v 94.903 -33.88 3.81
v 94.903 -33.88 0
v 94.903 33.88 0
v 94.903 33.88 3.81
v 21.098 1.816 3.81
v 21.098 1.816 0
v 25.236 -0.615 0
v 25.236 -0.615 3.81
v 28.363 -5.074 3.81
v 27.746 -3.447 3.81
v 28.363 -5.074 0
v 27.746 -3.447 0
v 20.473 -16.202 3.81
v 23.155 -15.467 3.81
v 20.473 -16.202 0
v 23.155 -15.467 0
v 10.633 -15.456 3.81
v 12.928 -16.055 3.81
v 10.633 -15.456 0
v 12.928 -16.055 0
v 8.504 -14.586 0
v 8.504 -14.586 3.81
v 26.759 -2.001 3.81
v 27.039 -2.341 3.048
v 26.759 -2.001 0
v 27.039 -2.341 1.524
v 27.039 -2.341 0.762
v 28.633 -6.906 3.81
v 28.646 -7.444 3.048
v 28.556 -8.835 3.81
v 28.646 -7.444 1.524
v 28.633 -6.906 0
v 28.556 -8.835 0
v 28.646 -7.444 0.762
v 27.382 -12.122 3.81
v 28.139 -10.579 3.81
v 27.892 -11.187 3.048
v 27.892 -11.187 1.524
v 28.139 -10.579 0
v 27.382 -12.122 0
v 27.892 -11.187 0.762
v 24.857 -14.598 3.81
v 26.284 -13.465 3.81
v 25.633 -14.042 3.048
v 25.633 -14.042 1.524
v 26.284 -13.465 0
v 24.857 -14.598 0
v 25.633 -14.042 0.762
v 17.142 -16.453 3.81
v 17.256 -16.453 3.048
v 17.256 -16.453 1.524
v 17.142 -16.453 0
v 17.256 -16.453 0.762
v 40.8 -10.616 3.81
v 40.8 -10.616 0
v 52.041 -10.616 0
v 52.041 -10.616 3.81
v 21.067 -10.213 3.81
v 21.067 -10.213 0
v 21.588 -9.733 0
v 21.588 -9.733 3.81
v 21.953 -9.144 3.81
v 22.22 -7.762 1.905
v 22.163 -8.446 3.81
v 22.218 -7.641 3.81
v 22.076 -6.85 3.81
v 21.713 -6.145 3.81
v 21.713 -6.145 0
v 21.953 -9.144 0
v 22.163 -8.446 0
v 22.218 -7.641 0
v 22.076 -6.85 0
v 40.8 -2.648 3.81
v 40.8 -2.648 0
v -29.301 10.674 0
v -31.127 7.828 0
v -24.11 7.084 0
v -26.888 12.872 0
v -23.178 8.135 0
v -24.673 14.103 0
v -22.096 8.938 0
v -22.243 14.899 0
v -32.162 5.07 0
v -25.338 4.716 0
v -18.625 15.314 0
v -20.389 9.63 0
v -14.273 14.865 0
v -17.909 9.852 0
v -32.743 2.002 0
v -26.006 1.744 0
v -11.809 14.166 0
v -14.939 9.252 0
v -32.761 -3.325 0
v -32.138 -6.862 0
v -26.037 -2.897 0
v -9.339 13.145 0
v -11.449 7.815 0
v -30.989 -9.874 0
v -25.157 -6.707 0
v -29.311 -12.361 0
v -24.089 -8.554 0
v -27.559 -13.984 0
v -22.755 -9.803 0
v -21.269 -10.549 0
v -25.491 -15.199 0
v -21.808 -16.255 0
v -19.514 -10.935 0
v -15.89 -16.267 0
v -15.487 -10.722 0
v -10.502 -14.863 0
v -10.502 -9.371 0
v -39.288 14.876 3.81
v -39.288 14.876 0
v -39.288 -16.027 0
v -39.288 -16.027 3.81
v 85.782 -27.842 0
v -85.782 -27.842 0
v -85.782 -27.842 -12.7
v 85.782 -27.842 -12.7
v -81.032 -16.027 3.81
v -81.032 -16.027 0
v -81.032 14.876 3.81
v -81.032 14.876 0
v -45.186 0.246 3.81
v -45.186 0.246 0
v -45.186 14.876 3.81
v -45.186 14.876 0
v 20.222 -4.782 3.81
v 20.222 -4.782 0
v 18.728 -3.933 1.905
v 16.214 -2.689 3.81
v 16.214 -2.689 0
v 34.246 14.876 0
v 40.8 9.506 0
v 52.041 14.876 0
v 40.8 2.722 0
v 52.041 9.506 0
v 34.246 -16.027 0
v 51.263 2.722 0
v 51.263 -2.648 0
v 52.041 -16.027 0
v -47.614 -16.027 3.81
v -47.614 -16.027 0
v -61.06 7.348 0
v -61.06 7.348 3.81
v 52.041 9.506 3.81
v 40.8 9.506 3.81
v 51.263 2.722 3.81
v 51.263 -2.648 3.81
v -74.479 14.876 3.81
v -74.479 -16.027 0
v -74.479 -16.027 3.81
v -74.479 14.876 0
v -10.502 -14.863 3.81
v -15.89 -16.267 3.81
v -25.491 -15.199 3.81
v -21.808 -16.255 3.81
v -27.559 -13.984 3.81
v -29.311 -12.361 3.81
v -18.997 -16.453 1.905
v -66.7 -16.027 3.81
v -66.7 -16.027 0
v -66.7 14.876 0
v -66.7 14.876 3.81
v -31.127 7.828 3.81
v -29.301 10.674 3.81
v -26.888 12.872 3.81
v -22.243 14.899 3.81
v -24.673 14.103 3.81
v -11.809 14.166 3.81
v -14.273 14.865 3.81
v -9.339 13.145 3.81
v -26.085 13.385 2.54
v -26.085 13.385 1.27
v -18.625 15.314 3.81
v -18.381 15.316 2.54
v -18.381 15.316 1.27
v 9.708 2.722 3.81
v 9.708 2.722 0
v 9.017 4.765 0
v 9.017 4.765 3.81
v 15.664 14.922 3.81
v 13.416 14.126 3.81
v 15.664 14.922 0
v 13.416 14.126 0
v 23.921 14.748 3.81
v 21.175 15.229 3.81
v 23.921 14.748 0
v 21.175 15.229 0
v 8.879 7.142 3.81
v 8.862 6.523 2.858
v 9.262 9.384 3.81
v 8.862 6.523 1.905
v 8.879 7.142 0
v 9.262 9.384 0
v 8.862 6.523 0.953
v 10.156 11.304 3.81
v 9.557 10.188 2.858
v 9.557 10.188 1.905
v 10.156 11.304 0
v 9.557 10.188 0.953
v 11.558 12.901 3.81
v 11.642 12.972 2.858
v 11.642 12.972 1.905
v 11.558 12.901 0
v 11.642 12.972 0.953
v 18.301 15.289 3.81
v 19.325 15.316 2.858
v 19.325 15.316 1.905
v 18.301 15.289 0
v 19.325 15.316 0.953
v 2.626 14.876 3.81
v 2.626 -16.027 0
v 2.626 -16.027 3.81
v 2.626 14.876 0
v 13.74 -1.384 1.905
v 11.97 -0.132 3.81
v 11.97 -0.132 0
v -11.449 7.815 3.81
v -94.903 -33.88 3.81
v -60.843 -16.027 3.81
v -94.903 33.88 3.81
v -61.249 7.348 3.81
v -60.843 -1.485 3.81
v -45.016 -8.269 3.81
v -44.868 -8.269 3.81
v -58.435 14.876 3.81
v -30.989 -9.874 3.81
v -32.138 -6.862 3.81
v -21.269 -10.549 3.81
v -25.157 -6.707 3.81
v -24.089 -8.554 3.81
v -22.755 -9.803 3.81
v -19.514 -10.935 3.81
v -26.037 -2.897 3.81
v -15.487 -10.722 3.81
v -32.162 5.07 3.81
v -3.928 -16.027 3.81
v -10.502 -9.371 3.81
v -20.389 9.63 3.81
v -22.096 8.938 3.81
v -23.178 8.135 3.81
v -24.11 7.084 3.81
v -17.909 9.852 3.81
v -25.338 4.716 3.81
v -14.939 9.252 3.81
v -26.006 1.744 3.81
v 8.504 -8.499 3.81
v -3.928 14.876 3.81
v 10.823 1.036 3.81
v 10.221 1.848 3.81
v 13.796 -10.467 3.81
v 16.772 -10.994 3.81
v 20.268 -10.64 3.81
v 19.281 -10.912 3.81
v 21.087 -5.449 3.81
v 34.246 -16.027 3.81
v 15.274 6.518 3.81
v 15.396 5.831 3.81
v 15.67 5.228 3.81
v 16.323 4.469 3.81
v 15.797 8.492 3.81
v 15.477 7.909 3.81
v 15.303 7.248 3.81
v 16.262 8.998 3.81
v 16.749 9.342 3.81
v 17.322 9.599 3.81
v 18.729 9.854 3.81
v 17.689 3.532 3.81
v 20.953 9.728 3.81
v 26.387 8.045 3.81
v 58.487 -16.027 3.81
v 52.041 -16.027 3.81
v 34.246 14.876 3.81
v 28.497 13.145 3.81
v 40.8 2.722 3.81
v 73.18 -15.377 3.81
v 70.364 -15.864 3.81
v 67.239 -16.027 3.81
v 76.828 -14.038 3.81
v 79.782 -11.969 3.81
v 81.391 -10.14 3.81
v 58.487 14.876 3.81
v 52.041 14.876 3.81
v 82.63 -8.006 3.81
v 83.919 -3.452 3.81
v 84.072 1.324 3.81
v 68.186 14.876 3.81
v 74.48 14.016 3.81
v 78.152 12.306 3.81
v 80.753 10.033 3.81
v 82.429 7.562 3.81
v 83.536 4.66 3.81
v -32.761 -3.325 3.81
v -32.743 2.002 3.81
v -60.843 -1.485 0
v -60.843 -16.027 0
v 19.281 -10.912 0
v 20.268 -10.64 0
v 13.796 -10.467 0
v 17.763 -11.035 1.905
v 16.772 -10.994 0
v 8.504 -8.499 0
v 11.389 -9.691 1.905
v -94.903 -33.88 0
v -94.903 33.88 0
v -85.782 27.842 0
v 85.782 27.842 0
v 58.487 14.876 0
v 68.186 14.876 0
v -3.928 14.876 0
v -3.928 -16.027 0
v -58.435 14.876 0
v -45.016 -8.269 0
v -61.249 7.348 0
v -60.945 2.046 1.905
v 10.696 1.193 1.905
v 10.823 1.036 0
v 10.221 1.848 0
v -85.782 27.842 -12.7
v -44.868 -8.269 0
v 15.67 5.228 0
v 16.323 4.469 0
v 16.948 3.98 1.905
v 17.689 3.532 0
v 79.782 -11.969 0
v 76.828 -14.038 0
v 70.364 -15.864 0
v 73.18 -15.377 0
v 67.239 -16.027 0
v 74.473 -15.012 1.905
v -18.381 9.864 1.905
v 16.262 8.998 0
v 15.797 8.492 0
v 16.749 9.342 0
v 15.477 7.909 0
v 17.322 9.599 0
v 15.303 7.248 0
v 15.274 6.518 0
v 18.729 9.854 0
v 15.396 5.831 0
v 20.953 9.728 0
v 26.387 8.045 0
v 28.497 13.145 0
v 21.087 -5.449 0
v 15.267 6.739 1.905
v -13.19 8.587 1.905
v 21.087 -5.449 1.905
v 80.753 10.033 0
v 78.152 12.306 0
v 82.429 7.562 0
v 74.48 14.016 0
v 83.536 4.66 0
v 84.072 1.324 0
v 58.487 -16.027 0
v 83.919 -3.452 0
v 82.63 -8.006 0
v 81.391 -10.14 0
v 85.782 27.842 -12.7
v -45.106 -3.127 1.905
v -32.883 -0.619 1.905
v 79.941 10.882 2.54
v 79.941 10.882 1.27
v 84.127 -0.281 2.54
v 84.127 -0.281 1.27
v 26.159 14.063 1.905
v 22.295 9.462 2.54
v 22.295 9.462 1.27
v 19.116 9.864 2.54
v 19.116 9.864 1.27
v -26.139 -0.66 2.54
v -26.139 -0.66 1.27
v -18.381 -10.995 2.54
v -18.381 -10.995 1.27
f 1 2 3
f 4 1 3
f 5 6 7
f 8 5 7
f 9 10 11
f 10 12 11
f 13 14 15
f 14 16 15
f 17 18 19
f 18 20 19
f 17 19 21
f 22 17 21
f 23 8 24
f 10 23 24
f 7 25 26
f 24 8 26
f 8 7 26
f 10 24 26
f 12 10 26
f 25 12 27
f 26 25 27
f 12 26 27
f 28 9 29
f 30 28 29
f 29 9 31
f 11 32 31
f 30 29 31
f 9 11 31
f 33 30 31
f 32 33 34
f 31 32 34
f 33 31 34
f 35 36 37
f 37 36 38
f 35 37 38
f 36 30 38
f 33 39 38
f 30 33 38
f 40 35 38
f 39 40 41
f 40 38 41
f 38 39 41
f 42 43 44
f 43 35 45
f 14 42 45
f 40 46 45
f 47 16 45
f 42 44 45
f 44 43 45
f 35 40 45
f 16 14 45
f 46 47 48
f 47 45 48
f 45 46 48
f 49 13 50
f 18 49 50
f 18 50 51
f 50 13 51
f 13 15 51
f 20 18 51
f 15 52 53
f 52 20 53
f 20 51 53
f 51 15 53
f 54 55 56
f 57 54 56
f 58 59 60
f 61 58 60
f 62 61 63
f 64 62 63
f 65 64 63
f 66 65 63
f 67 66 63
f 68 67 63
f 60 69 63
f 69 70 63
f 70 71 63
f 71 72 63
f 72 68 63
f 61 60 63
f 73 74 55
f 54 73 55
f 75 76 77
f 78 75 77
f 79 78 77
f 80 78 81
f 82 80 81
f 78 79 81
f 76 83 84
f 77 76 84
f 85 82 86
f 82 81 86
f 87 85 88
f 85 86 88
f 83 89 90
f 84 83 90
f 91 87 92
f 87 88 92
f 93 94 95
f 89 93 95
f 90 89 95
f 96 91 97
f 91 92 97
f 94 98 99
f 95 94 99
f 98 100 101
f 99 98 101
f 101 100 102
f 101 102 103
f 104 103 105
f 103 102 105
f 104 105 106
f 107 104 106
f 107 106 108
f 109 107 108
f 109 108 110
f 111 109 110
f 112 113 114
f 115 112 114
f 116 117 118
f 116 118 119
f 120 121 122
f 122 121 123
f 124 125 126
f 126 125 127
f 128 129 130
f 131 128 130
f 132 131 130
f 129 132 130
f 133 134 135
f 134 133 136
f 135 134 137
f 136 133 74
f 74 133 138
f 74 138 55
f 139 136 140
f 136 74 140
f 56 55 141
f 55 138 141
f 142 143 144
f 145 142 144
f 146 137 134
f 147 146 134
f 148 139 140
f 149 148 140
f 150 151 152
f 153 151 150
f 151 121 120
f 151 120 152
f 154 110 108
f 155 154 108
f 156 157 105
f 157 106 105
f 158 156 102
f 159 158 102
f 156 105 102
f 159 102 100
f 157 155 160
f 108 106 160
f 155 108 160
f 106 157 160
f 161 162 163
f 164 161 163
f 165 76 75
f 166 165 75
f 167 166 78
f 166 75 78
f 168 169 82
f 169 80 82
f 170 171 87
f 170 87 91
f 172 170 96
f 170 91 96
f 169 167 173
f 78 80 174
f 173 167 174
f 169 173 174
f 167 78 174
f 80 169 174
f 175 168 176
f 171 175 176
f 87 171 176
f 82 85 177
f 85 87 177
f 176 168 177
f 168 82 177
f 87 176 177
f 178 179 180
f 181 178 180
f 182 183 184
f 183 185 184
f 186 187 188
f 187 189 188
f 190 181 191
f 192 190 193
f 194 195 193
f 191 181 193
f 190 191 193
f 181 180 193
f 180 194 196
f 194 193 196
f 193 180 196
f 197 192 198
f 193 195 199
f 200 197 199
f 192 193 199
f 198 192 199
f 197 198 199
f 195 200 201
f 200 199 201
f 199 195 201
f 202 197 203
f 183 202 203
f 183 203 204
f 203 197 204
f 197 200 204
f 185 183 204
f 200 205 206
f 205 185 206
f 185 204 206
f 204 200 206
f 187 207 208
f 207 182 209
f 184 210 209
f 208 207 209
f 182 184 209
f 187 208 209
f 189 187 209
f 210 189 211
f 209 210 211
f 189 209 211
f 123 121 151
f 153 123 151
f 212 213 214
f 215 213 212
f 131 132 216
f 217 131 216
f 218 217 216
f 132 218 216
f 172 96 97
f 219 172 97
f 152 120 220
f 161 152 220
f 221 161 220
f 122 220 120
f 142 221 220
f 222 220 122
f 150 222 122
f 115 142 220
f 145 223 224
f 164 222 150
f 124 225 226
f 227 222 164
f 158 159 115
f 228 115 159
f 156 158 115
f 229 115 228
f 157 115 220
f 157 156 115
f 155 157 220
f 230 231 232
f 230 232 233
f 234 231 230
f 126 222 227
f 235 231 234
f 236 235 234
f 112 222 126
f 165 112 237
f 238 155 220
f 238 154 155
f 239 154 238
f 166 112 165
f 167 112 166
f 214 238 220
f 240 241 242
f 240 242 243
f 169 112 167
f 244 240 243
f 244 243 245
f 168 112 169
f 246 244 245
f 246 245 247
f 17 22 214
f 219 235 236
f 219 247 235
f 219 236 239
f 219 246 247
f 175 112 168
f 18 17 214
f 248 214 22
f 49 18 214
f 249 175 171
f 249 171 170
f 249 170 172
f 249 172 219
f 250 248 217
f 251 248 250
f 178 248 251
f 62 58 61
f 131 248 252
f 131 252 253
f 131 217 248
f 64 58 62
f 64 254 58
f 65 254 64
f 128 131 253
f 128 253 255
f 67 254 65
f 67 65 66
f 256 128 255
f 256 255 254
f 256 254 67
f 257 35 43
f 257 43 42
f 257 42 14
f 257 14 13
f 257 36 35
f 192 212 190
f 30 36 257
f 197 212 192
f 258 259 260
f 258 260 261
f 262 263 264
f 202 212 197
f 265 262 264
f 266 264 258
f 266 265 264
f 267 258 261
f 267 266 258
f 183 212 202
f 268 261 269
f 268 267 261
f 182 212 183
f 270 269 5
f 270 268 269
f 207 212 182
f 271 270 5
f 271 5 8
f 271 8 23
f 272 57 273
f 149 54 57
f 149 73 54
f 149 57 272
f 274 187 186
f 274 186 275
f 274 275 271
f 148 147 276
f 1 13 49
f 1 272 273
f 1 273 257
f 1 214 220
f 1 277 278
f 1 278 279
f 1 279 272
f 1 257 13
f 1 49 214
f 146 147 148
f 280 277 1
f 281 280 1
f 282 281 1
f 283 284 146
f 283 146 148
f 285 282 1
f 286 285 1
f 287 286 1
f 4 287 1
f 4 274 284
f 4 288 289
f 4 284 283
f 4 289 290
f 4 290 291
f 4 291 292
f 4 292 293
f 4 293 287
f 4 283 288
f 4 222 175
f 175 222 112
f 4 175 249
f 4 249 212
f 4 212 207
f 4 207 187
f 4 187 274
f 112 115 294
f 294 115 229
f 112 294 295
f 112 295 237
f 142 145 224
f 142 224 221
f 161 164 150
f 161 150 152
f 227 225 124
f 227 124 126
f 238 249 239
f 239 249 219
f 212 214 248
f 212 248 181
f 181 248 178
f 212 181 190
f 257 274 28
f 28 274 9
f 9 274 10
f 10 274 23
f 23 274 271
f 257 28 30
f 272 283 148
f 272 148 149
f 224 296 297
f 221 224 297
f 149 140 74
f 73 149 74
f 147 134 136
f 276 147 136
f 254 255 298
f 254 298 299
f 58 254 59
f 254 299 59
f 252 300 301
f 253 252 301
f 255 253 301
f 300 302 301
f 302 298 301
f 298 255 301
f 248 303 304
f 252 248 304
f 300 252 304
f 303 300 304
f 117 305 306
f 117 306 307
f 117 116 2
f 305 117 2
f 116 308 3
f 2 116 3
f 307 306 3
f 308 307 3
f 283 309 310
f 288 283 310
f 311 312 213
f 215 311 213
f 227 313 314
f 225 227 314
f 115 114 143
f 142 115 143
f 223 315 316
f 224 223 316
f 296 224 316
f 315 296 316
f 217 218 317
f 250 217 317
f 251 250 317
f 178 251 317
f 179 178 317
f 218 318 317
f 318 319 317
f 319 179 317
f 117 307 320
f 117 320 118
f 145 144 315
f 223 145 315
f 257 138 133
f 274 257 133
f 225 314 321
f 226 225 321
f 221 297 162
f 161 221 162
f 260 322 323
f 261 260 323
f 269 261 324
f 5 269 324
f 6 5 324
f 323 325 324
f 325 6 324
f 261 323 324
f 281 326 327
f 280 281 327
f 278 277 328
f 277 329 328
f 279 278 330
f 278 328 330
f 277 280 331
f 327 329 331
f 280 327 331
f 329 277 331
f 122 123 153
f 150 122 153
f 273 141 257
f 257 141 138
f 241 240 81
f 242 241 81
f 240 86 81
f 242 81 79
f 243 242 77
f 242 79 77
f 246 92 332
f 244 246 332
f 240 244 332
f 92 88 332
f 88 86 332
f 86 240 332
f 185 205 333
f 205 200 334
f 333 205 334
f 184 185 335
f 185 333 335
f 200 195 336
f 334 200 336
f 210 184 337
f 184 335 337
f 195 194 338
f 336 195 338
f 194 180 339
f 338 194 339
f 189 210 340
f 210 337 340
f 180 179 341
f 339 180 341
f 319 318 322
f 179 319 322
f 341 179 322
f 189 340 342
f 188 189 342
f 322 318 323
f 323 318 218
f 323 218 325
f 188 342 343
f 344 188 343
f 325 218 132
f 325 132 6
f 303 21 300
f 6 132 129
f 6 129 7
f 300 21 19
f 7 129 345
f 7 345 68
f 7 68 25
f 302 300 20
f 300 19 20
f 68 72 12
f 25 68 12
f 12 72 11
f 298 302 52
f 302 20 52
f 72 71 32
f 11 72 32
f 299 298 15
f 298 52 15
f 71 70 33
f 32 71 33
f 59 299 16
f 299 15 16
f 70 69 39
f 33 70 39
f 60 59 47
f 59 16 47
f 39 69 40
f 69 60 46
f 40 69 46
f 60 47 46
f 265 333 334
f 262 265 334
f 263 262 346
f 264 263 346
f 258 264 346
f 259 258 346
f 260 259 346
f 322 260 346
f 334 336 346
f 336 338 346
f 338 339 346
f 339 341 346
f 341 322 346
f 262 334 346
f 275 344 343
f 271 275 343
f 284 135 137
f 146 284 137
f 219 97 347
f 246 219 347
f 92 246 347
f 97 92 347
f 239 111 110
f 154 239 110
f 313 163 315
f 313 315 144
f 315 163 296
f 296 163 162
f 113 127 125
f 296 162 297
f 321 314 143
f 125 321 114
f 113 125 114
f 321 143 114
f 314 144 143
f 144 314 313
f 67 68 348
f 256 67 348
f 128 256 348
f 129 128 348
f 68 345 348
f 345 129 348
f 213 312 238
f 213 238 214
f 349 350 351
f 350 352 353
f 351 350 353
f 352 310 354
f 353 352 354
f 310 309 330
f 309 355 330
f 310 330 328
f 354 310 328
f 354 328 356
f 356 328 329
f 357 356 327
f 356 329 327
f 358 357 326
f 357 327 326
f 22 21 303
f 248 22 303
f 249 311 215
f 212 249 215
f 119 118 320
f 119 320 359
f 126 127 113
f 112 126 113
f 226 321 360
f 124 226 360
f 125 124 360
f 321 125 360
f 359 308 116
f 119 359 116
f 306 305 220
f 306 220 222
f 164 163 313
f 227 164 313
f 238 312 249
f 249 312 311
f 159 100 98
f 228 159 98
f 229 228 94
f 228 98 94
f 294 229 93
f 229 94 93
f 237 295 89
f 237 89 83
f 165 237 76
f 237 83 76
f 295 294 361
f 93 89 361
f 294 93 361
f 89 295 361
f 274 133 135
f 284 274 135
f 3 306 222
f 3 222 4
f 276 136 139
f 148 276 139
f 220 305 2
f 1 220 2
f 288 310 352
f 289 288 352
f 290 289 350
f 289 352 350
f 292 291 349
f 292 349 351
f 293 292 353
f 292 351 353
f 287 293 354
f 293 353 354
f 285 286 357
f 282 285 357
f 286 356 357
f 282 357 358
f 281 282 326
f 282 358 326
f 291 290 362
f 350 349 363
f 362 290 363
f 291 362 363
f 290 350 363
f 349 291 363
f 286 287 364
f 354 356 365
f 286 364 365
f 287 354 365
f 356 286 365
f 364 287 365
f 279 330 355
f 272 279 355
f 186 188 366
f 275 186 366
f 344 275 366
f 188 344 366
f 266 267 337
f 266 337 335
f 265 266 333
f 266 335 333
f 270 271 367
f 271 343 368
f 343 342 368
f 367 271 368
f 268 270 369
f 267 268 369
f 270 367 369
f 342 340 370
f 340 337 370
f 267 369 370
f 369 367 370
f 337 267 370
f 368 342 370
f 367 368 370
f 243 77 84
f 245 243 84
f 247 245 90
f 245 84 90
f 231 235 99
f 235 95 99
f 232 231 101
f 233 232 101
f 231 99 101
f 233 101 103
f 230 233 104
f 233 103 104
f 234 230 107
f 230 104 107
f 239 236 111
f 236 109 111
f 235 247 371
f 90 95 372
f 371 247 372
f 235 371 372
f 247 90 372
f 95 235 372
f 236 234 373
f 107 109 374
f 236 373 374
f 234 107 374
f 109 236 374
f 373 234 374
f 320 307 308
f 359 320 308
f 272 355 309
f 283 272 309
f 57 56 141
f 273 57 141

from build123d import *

# Parameters (mm, degrees)
F0_W     = 189.8058950901
F0_H     = 67.760951817
F0_W_2   = 6.5539043493
F0_H_2   = 30.9027749966
F1_DEPTH = 3.81
F2_W     = 171.5631633997
F2_H     = 55.6830503047
F3_DEPTH = 5.08
F4_DEPTH = 12.7


with BuildPart() as f1:
    # F0 (on Top) → F1 (new body)
    with BuildSketch(Plane.XY):
        Rectangle(F0_W, F0_H)
        with Locations((-77.7555048497, -0.57536364)):
            Rectangle(F0_W_2, F0_H_2, mode=Mode.SUBTRACT)
        with BuildLine():
            Line((-39.2876710145, 14.8760238584), (-39.2876710145, -16.0267511383))
            Line((-39.2876710145, -16.0267511383), (-47.6136320609, -16.0267511383))
            Line((-47.6136320609, -16.0267511383), (-61.0596195183, 7.3481646832))
            Line((-61.0596195183, 7.3481646832), (-61.2489996234, 7.3481646832))
            add(Edge.make_bspline(
                [(-61.2489996234, 7.3481646832), (-60.8431851126, 1.1594933937), (-60.8431851126, -1.4850645016)],
                knots=[0, 0, 0, 1, 1, 1], degree=2))
            Line((-60.8431851126, -1.4850645016), (-60.8431851126, -16.0267511383))
            Line((-60.8431851126, -16.0267511383), (-66.7004412183, -16.0267511383))
            Line((-66.7004412183, -16.0267511383), (-66.7004412183, 14.8760238584))
            Line((-66.7004412183, 14.8760238584), (-58.4353523486, 14.8760238584))
            Line((-58.4353523486, 14.8760238584), (-45.0164191918, -8.268930407))
            Line((-45.0164191918, -8.268930407), (-44.8676205378, -8.268930407))
            add(Edge.make_bspline(
                [(-44.8676205378, -8.268930407), (-45.1855085713, -2.2425849218), (-45.1855085713, 0.2464107444)],
                knots=[0, 0, 0, 1, 1, 1], degree=2))
            Line((-45.1855085713, 0.2464107444), (-45.1855085713, 14.8760238584))
            Line((-45.1855085713, 14.8760238584), (-39.2876710145, 14.8760238584))
        make_face(mode=Mode.SUBTRACT)
        with BuildLine():
            add(Edge.make_bspline(
                [(-14.9388003671, 9.2521110963), (-16.6905663387, 9.8642146501), (-18.3814601336, 9.8642146501)],
                knots=[0, 0, 0, 1, 1, 1], degree=2))
            add(Edge.make_bspline(
                [(-18.3814601336, 9.8642146501), (-22.081135757, 9.8642146501), (-24.110208311, 7.0843852512)],
                knots=[0, 0, 0, 1, 1, 1], degree=2))
            add(Edge.make_bspline(
                [(-24.110208311, 7.0843852512), (-26.1392808649, 4.3045558523), (-26.1392808649, -0.6599083297)],
                knots=[0, 0, 0, 1, 1, 1], degree=2))
            add(Edge.make_bspline(
                [(-26.1392808649, -0.6599083297), (-26.1392808649, -10.9946512045), (-18.3814601336, -10.9946512045)],
                knots=[0, 0, 0, 1, 1, 1], degree=2))
            add(Edge.make_bspline(
                [(-18.3814601336, -10.9946512045), (-15.1281804721, -10.9946512045), (-10.5018950491, -9.3713931613)],
                knots=[0, 0, 0, 1, 1, 1], degree=2))
            Line((-10.5018950491, -9.3713931613), (-10.5018950491, -14.8634162073))
            add(Edge.make_bspline(
                [(-10.5018950491, -14.8634162073), (-14.3030243002, -16.4528563746), (-18.996945475, -16.4528563746)],
                knots=[0, 0, 0, 1, 1, 1], degree=2))
            add(Edge.make_bspline(
                [(-18.996945475, -16.4528563746), (-25.7402299293, -16.4528563746), (-29.3113976242, -12.3608933908)],
                knots=[0, 0, 0, 1, 1, 1], degree=2))
            add(Edge.make_bspline(
                [(-29.3113976242, -12.3608933908), (-32.8825653192, -8.268930407), (-32.8825653192, -0.6193268786)],
                knots=[0, 0, 0, 1, 1, 1], degree=2))
            add(Edge.make_bspline(
                [(-32.8825653192, -0.6193268786), (-32.8825653192, 4.2031022246), (-31.12741756, 7.828378521)],
                knots=[0, 0, 0, 1, 1, 1], degree=2))
            add(Edge.make_bspline(
                [(-31.12741756, 7.828378521), (-29.3722698009, 11.4536548174), (-26.0851722635, 13.3846555312)],
                knots=[0, 0, 0, 1, 1, 1], degree=2))
            add(Edge.make_bspline(
                [(-26.0851722635, 13.3846555312), (-22.7980747261, 15.315656245), (-18.3814601336, 15.315656245)],
                knots=[0, 0, 0, 1, 1, 1], degree=2))
            add(Edge.make_bspline(
                [(-18.3814601336, 15.315656245), (-13.8836826391, 15.315656245), (-9.3385601182, 13.1445486123)],
                knots=[0, 0, 0, 1, 1, 1], degree=2))
            Line((-9.3385601182, 13.1445486123), (-11.4487955743, 7.8148513706))
            add(Edge.make_bspline(
                [(-11.4487955743, 7.8148513706), (-13.1870343955, 8.6400075426), (-14.9388003671, 9.2521110963)],
                knots=[0, 0, 0, 1, 1, 1], degree=2))
        make_face(mode=Mode.SUBTRACT)
        with Locations((-0.6507477997, -0.57536364)):
            Rectangle(F0_W_2, F0_H_2, mode=Mode.SUBTRACT)
        with BuildLine():
            add(Edge.make_bspline(
                [(27.0393289865, -2.3406567619), (28.6456780917, -4.4204561297), (28.6456780917, -7.4437742351)],
                knots=[0, 0, 0, 1, 1, 1], degree=2))
            add(Edge.make_bspline(
                [(28.6456780917, -7.4437742351), (28.6456780917, -11.6304272714), (25.6325053491, -14.041641823)],
                knots=[0, 0, 0, 1, 1, 1], degree=2))
            add(Edge.make_bspline(
                [(25.6325053491, -14.041641823), (22.6193326065, -16.4528563746), (17.2558174889, -16.4528563746)],
                knots=[0, 0, 0, 1, 1, 1], degree=2))
            add(Edge.make_bspline(
                [(17.2558174889, -16.4528563746), (12.3048804572, -16.4528563746), (8.5037512062, -14.586109625)],
                knots=[0, 0, 0, 1, 1, 1], degree=2))
            Line((8.5037512062, -14.586109625), (8.5037512062, -8.4988919631))
            add(Edge.make_bspline(
                [(8.5037512062, -8.4988919631), (11.6285229392, -9.8989520253), (13.7962487844, -10.4670923405)],
                knots=[0, 0, 0, 1, 1, 1], degree=2))
            add(Edge.make_bspline(
                [(13.7962487844, -10.4670923405), (15.9639746295, -11.0352326556), (17.7630856273, -11.0352326556)],
                knots=[0, 0, 0, 1, 1, 1], degree=2))
            add(Edge.make_bspline(
                [(17.7630856273, -11.0352326556), (19.9139025345, -11.0352326556), (21.0670921027, -10.2134582712)],
                knots=[0, 0, 0, 1, 1, 1], degree=2))
            add(Edge.make_bspline(
                [(21.0670921027, -10.2134582712), (22.2202816708, -9.3916838869), (22.2202816708, -7.7616622685)],
                knots=[0, 0, 0, 1, 1, 1], degree=2))
            add(Edge.make_bspline(
                [(22.2202816708, -7.7616622685), (22.2202816708, -6.8553431944), (21.7130135324, -6.1451678005)],
                knots=[0, 0, 0, 1, 1, 1], degree=2))
            add(Edge.make_bspline(
                [(21.7130135324, -6.1451678005), (21.2057453939, -5.4349924067), (20.2216452052, -4.7823074018)],
                knots=[0, 0, 0, 1, 1, 1], degree=2))
            add(Edge.make_bspline(
                [(20.2216452052, -4.7823074018), (19.2375450165, -4.129622397), (16.2142269112, -2.6889808837)],
                knots=[0, 0, 0, 1, 1, 1], degree=2))
            add(Edge.make_bspline(
                [(16.2142269112, -2.6889808837), (13.387052486, -1.3565565732), (11.9700834858, -0.1323494657)],
                knots=[0, 0, 0, 1, 1, 1], degree=2))
            add(Edge.make_bspline(
                [(11.9700834858, -0.1323494657), (10.5531144856, 1.0918576419), (9.7076675882, 2.7218792602)],
                knots=[0, 0, 0, 1, 1, 1], degree=2))
            add(Edge.make_bspline(
                [(9.7076675882, 2.7218792602), (8.8622206907, 4.3519008785), (8.8622206907, 6.5230085113)],
                knots=[0, 0, 0, 1, 1, 1], degree=2))
            add(Edge.make_bspline(
                [(8.8622206907, 6.5230085113), (8.8622206907, 10.6284986454), (11.6420500896, 12.9720774452)],
                knots=[0, 0, 0, 1, 1, 1], degree=2))
            add(Edge.make_bspline(
                [(11.6420500896, 12.9720774452), (14.4218794885, 15.315656245), (19.3254714939, 15.315656245)],
                knots=[0, 0, 0, 1, 1, 1], degree=2))
            add(Edge.make_bspline(
                [(19.3254714939, 15.315656245), (21.7333042579, 15.315656245), (23.9213208286, 14.7475159299)],
                knots=[0, 0, 0, 1, 1, 1], degree=2))
            add(Edge.make_bspline(
                [(23.9213208286, 14.7475159299), (26.1093373992, 14.1793756148), (28.4968794377, 13.1445486123)],
                knots=[0, 0, 0, 1, 1, 1], degree=2))
            Line((28.4968794377, 13.1445486123), (26.3866439816, 8.0448129267))
            add(Edge.make_bspline(
                [(26.3866439816, 8.0448129267), (23.9111754658, 9.0593492037), (22.2946809978, 9.4617819269)],
                knots=[0, 0, 0, 1, 1, 1], degree=2))
            add(Edge.make_bspline(
                [(22.2946809978, 9.4617819269), (20.6781865298, 9.8642146501), (19.1158006633, 9.8642146501)],
                knots=[0, 0, 0, 1, 1, 1], degree=2))
            add(Edge.make_bspline(
                [(19.1158006633, 9.8642146501), (17.2558174889, 9.8642146501), (16.2615719374, 8.9984770271)],
                knots=[0, 0, 0, 1, 1, 1], degree=2))
            add(Edge.make_bspline(
                [(16.2615719374, 8.9984770271), (15.267326386, 8.1327394041), (15.267326386, 6.739442917)],
                knots=[0, 0, 0, 1, 1, 1], degree=2))
            add(Edge.make_bspline(
                [(15.267326386, 6.739442917), (15.267326386, 5.873705294), (15.6697591092, 5.2277838643)],
                knots=[0, 0, 0, 1, 1, 1], degree=2))
            add(Edge.make_bspline(
                [(15.6697591092, 5.2277838643), (16.0721918324, 4.5818624347), (16.9480748182, 3.9799042437)],
                knots=[0, 0, 0, 1, 1, 1], degree=2))
            add(Edge.make_bspline(
                [(16.9480748182, 3.9799042437), (17.823957804, 3.3779460527), (21.097528191, 1.8155601861)],
                knots=[0, 0, 0, 1, 1, 1], degree=2))
            add(Edge.make_bspline(
                [(21.097528191, 1.8155601861), (25.4329798813, -0.2608573941), (27.0393289865, -2.3406567619)],
                knots=[0, 0, 0, 1, 1, 1], degree=2))
        make_face(mode=Mode.SUBTRACT)
        Polygon((52.0408846387, -10.6158909944), (52.0408846387, -16.0267511383), (34.2459183406, -16.0267511383), (34.2459183406, 14.8760238584), (52.0408846387, 14.8760238584), (52.0408846387, 9.5057451656), (40.7998226898, 9.5057451656), (40.7998226898, 2.7218792602), (51.263073493, 2.7218792602), (51.263073493, -2.6483994326), (40.7998226898, -2.6483994326), (40.7998226898, -10.6158909944), align=None, mode=Mode.SUBTRACT)
        with BuildLine():
            add(Edge.make_bspline(
                [(79.9406322555, 10.8821327147), (84.1272852918, 6.888241571), (84.1272852918, -0.2811481196)],
                knots=[0, 0, 0, 1, 1, 1], degree=2))
            add(Edge.make_bspline(
                [(84.1272852918, -0.2811481196), (84.1272852918, -7.9104609225), (79.7816882388, -11.9686060304)],
                knots=[0, 0, 0, 1, 1, 1], degree=2))
            add(Edge.make_bspline(
                [(79.7816882388, -11.9686060304), (75.4360911857, -16.0267511383), (67.2386380678, -16.0267511383)],
                knots=[0, 0, 0, 1, 1, 1], degree=2))
            Line((67.2386380678, -16.0267511383), (58.4865717851, -16.0267511383))
            Line((58.4865717851, -16.0267511383), (58.4865717851, 14.8760238584))
            Line((58.4865717851, 14.8760238584), (68.1855385929, 14.8760238584))
            add(Edge.make_bspline(
                [(68.1855385929, 14.8760238584), (75.7539792192, 14.8760238584), (79.9406322555, 10.8821327147)],
                knots=[0, 0, 0, 1, 1, 1], degree=2))
        make_face(mode=Mode.SUBTRACT)
    extrude(amount=F1_DEPTH)

    # F2 (on face) → F3 (cut)
    with BuildSketch(Plane(origin=(0, 0, 0), x_dir=(1, 0, 0), z_dir=(0, 0, -1))):
        Rectangle(F2_W, F2_H)
    extrude(amount=F3_DEPTH, mode=Mode.SUBTRACT)

    # F2 (on face) → F4 (join)
    with BuildSketch(Plane(origin=(0, 0, 0), x_dir=(1, 0, 0), z_dir=(0, 0, -1))):
        Rectangle(F2_W, F2_H)
    extrude(amount=F4_DEPTH)


solid = f1.part
